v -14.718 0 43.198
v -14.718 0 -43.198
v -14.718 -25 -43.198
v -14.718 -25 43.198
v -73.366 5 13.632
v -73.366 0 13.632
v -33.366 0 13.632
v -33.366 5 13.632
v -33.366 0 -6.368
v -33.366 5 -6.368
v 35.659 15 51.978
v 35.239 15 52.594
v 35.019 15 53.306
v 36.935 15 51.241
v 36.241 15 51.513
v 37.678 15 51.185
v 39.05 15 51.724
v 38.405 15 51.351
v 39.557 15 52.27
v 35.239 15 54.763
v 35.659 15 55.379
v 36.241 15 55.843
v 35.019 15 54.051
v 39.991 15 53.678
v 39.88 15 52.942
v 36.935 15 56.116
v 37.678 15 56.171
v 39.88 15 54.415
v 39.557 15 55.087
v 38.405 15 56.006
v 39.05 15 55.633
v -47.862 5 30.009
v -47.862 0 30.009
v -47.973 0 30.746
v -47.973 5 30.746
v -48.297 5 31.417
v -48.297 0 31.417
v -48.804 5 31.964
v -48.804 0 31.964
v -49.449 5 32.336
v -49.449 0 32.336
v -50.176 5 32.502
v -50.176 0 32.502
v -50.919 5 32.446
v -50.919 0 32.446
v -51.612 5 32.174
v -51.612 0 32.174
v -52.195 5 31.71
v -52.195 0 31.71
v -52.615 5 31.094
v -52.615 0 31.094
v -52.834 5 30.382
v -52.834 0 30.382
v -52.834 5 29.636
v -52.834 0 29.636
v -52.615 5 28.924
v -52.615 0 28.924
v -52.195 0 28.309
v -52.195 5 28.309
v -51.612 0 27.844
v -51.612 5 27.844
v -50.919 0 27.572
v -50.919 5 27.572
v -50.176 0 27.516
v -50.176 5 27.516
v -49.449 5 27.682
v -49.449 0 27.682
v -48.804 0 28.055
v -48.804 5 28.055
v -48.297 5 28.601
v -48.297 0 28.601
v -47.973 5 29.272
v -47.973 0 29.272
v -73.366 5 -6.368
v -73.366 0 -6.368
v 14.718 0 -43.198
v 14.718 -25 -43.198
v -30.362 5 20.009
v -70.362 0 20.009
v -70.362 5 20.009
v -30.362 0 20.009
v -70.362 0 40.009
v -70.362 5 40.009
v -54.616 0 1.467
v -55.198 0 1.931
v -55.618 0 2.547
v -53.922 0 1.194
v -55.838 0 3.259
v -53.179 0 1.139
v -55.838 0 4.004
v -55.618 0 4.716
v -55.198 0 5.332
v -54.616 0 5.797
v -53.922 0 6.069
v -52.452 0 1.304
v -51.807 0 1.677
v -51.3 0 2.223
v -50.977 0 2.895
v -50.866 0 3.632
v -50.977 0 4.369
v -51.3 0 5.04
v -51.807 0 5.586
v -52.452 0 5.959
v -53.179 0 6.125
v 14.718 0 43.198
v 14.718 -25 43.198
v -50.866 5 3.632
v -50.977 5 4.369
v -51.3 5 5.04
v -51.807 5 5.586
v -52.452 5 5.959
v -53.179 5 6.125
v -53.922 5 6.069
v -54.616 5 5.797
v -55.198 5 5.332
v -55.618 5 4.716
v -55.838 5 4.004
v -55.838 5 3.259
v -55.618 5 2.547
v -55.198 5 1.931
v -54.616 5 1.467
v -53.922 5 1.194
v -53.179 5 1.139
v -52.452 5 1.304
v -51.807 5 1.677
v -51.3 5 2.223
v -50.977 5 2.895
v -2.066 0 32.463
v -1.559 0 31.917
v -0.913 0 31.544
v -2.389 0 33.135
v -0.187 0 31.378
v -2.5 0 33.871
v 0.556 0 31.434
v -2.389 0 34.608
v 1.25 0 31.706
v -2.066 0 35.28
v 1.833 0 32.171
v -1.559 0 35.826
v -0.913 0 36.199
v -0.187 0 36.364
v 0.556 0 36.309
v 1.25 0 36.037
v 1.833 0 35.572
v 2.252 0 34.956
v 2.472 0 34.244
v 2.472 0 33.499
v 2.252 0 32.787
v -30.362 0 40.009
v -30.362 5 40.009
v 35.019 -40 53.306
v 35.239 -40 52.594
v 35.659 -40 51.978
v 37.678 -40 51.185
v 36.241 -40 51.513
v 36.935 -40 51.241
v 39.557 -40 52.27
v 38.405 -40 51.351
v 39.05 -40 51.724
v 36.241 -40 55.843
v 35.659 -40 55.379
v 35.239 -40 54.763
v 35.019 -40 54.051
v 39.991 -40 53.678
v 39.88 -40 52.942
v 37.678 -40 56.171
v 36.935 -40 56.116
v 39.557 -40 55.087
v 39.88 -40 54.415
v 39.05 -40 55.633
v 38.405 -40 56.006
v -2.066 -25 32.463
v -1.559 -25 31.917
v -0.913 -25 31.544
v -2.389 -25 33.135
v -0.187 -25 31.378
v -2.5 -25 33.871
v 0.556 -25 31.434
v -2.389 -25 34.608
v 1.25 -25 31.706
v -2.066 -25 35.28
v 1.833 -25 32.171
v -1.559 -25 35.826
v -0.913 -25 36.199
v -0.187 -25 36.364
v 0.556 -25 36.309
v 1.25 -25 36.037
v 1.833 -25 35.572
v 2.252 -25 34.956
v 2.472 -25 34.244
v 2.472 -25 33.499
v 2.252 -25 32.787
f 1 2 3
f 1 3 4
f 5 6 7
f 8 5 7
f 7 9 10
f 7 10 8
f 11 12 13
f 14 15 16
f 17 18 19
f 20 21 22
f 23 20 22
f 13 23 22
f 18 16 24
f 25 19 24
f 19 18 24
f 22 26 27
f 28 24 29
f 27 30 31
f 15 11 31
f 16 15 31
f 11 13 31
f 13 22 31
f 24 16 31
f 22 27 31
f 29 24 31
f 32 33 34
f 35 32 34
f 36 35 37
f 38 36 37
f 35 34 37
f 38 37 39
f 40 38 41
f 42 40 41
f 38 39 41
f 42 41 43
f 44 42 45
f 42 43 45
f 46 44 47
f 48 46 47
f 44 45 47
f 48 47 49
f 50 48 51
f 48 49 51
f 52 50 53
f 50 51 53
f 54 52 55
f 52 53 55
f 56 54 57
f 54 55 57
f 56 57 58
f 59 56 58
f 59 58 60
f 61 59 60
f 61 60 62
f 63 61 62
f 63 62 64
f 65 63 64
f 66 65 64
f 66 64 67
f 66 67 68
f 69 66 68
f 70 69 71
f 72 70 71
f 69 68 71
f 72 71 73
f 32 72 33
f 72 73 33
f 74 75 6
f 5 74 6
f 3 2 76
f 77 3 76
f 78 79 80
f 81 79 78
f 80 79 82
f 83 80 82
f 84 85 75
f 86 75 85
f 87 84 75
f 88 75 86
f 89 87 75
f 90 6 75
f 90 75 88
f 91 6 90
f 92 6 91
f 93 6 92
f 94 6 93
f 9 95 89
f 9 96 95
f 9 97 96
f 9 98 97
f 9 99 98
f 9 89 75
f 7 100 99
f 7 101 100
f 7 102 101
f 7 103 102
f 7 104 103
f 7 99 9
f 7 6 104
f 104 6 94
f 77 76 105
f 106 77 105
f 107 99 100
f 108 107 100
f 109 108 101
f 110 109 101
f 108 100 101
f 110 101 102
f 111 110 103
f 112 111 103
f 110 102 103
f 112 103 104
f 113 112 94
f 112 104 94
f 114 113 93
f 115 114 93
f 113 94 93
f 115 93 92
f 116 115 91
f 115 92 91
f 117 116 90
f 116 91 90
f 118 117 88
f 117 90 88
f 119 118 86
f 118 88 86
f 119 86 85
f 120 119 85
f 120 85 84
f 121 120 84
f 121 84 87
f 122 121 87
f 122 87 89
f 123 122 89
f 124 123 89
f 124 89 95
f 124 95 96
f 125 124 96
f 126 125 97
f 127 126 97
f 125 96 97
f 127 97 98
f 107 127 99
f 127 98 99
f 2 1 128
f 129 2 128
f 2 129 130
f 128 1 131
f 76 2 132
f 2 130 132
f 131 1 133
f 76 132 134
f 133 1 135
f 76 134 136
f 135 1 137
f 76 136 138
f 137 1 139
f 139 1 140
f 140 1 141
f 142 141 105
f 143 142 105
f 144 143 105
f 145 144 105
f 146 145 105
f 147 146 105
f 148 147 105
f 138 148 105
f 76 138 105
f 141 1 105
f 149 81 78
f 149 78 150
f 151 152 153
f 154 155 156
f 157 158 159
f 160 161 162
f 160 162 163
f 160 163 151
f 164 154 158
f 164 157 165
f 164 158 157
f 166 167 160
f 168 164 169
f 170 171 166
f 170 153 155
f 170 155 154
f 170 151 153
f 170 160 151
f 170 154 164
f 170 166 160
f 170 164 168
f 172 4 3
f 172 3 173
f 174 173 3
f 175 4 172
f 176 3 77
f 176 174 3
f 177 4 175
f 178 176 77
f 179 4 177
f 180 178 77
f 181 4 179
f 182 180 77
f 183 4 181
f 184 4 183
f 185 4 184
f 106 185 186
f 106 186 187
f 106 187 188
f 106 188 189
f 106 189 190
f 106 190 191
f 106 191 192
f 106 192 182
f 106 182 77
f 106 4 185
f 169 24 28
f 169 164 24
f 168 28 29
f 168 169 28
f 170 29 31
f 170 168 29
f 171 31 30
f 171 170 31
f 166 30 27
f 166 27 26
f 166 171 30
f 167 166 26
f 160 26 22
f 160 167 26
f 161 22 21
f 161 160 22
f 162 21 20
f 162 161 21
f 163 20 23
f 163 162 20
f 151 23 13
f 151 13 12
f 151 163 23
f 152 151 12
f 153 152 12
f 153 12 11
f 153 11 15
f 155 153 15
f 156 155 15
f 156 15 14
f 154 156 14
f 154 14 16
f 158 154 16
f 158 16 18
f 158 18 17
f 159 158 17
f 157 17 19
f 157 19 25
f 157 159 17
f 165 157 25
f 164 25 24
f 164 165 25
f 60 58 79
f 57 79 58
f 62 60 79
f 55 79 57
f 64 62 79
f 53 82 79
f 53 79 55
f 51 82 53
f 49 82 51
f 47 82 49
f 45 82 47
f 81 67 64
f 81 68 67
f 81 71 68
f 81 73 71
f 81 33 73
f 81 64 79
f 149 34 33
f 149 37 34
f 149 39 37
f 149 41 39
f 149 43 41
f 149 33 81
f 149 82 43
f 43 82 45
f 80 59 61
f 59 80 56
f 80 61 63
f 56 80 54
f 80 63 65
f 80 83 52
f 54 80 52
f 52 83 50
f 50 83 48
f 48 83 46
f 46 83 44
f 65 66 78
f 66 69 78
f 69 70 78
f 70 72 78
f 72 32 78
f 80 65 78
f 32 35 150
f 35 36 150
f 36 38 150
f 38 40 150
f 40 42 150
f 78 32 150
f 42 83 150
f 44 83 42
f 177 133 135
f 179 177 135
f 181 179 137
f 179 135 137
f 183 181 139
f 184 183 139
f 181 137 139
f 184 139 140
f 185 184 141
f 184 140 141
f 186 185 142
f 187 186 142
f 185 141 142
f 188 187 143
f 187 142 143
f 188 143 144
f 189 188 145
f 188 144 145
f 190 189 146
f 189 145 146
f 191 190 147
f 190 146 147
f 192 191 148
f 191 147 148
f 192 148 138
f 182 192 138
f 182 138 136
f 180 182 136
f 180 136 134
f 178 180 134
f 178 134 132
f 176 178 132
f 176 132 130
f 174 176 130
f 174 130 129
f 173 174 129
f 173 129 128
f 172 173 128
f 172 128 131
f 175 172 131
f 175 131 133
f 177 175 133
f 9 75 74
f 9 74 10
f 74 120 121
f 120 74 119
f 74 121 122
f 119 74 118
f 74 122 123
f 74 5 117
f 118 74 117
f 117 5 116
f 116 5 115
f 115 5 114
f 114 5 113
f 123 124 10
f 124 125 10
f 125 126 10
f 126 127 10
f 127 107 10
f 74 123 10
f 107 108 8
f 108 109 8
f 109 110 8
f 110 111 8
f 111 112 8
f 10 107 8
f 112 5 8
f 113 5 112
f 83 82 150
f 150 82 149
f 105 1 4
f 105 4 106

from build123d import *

# Parameters (mm, degrees)
F0_W          = 29.435682
F0_H          = 86.395636
F1_DEPTH      = 25
F3_D          = 5
F4_R          = 2.5
F5_DEPTH      = 40
F5_DEPTH_BACK = 15
F6_W          = 40
F6_H          = 20
F6_R          = 2.5
F7_DEPTH      = 5
F8_W          = 40
F8_H          = 20
F8_R          = 2.5
F9_DEPTH      = 5


with BuildPart() as f1:
    # F0 (on Front) → F1 (new body)
    with BuildSketch(Plane.XZ):
        Rectangle(F0_W, F0_H)
    extrude(amount=F1_DEPTH)

    # F3 (through all)
    with Locations(Plane.XZ.offset(25)):
        with Locations((0, 33.871471)):
            Hole(F3_D / 2)


with BuildPart() as f5:
    # F4 (on Front) → F5 (new body, two sides)
    with BuildSketch(Plane.XZ) as f5_sk:
        with Locations((37.49134, 53.678397)):
            Circle(F4_R)
    extrude(amount=F5_DEPTH)
    extrude(f5_sk.sketch, amount=-F5_DEPTH_BACK)


with BuildPart() as f7:
    # F6 (on Front) → F7 (new body)
    with BuildSketch(Plane.XZ):
        with Locations((-50.362385, 30.009104)):
            Rectangle(F6_W, F6_H)
        with Locations((-50.362385, 30.009104)):
            Circle(F6_R, mode=Mode.SUBTRACT)
    extrude(amount=-F7_DEPTH)


with BuildPart() as f9:
    # F8 (on Front) → F9 (new body)
    with BuildSketch(Plane.XZ):
        with Locations((-53.365597, 3.631675)):
            Rectangle(F8_W, F8_H)
        with Locations((-53.365597, 3.631675)):
            Circle(F8_R, mode=Mode.SUBTRACT)
    extrude(amount=-F9_DEPTH)


solid = Compound([f1.part, f5.part, f7.part, f9.part])
